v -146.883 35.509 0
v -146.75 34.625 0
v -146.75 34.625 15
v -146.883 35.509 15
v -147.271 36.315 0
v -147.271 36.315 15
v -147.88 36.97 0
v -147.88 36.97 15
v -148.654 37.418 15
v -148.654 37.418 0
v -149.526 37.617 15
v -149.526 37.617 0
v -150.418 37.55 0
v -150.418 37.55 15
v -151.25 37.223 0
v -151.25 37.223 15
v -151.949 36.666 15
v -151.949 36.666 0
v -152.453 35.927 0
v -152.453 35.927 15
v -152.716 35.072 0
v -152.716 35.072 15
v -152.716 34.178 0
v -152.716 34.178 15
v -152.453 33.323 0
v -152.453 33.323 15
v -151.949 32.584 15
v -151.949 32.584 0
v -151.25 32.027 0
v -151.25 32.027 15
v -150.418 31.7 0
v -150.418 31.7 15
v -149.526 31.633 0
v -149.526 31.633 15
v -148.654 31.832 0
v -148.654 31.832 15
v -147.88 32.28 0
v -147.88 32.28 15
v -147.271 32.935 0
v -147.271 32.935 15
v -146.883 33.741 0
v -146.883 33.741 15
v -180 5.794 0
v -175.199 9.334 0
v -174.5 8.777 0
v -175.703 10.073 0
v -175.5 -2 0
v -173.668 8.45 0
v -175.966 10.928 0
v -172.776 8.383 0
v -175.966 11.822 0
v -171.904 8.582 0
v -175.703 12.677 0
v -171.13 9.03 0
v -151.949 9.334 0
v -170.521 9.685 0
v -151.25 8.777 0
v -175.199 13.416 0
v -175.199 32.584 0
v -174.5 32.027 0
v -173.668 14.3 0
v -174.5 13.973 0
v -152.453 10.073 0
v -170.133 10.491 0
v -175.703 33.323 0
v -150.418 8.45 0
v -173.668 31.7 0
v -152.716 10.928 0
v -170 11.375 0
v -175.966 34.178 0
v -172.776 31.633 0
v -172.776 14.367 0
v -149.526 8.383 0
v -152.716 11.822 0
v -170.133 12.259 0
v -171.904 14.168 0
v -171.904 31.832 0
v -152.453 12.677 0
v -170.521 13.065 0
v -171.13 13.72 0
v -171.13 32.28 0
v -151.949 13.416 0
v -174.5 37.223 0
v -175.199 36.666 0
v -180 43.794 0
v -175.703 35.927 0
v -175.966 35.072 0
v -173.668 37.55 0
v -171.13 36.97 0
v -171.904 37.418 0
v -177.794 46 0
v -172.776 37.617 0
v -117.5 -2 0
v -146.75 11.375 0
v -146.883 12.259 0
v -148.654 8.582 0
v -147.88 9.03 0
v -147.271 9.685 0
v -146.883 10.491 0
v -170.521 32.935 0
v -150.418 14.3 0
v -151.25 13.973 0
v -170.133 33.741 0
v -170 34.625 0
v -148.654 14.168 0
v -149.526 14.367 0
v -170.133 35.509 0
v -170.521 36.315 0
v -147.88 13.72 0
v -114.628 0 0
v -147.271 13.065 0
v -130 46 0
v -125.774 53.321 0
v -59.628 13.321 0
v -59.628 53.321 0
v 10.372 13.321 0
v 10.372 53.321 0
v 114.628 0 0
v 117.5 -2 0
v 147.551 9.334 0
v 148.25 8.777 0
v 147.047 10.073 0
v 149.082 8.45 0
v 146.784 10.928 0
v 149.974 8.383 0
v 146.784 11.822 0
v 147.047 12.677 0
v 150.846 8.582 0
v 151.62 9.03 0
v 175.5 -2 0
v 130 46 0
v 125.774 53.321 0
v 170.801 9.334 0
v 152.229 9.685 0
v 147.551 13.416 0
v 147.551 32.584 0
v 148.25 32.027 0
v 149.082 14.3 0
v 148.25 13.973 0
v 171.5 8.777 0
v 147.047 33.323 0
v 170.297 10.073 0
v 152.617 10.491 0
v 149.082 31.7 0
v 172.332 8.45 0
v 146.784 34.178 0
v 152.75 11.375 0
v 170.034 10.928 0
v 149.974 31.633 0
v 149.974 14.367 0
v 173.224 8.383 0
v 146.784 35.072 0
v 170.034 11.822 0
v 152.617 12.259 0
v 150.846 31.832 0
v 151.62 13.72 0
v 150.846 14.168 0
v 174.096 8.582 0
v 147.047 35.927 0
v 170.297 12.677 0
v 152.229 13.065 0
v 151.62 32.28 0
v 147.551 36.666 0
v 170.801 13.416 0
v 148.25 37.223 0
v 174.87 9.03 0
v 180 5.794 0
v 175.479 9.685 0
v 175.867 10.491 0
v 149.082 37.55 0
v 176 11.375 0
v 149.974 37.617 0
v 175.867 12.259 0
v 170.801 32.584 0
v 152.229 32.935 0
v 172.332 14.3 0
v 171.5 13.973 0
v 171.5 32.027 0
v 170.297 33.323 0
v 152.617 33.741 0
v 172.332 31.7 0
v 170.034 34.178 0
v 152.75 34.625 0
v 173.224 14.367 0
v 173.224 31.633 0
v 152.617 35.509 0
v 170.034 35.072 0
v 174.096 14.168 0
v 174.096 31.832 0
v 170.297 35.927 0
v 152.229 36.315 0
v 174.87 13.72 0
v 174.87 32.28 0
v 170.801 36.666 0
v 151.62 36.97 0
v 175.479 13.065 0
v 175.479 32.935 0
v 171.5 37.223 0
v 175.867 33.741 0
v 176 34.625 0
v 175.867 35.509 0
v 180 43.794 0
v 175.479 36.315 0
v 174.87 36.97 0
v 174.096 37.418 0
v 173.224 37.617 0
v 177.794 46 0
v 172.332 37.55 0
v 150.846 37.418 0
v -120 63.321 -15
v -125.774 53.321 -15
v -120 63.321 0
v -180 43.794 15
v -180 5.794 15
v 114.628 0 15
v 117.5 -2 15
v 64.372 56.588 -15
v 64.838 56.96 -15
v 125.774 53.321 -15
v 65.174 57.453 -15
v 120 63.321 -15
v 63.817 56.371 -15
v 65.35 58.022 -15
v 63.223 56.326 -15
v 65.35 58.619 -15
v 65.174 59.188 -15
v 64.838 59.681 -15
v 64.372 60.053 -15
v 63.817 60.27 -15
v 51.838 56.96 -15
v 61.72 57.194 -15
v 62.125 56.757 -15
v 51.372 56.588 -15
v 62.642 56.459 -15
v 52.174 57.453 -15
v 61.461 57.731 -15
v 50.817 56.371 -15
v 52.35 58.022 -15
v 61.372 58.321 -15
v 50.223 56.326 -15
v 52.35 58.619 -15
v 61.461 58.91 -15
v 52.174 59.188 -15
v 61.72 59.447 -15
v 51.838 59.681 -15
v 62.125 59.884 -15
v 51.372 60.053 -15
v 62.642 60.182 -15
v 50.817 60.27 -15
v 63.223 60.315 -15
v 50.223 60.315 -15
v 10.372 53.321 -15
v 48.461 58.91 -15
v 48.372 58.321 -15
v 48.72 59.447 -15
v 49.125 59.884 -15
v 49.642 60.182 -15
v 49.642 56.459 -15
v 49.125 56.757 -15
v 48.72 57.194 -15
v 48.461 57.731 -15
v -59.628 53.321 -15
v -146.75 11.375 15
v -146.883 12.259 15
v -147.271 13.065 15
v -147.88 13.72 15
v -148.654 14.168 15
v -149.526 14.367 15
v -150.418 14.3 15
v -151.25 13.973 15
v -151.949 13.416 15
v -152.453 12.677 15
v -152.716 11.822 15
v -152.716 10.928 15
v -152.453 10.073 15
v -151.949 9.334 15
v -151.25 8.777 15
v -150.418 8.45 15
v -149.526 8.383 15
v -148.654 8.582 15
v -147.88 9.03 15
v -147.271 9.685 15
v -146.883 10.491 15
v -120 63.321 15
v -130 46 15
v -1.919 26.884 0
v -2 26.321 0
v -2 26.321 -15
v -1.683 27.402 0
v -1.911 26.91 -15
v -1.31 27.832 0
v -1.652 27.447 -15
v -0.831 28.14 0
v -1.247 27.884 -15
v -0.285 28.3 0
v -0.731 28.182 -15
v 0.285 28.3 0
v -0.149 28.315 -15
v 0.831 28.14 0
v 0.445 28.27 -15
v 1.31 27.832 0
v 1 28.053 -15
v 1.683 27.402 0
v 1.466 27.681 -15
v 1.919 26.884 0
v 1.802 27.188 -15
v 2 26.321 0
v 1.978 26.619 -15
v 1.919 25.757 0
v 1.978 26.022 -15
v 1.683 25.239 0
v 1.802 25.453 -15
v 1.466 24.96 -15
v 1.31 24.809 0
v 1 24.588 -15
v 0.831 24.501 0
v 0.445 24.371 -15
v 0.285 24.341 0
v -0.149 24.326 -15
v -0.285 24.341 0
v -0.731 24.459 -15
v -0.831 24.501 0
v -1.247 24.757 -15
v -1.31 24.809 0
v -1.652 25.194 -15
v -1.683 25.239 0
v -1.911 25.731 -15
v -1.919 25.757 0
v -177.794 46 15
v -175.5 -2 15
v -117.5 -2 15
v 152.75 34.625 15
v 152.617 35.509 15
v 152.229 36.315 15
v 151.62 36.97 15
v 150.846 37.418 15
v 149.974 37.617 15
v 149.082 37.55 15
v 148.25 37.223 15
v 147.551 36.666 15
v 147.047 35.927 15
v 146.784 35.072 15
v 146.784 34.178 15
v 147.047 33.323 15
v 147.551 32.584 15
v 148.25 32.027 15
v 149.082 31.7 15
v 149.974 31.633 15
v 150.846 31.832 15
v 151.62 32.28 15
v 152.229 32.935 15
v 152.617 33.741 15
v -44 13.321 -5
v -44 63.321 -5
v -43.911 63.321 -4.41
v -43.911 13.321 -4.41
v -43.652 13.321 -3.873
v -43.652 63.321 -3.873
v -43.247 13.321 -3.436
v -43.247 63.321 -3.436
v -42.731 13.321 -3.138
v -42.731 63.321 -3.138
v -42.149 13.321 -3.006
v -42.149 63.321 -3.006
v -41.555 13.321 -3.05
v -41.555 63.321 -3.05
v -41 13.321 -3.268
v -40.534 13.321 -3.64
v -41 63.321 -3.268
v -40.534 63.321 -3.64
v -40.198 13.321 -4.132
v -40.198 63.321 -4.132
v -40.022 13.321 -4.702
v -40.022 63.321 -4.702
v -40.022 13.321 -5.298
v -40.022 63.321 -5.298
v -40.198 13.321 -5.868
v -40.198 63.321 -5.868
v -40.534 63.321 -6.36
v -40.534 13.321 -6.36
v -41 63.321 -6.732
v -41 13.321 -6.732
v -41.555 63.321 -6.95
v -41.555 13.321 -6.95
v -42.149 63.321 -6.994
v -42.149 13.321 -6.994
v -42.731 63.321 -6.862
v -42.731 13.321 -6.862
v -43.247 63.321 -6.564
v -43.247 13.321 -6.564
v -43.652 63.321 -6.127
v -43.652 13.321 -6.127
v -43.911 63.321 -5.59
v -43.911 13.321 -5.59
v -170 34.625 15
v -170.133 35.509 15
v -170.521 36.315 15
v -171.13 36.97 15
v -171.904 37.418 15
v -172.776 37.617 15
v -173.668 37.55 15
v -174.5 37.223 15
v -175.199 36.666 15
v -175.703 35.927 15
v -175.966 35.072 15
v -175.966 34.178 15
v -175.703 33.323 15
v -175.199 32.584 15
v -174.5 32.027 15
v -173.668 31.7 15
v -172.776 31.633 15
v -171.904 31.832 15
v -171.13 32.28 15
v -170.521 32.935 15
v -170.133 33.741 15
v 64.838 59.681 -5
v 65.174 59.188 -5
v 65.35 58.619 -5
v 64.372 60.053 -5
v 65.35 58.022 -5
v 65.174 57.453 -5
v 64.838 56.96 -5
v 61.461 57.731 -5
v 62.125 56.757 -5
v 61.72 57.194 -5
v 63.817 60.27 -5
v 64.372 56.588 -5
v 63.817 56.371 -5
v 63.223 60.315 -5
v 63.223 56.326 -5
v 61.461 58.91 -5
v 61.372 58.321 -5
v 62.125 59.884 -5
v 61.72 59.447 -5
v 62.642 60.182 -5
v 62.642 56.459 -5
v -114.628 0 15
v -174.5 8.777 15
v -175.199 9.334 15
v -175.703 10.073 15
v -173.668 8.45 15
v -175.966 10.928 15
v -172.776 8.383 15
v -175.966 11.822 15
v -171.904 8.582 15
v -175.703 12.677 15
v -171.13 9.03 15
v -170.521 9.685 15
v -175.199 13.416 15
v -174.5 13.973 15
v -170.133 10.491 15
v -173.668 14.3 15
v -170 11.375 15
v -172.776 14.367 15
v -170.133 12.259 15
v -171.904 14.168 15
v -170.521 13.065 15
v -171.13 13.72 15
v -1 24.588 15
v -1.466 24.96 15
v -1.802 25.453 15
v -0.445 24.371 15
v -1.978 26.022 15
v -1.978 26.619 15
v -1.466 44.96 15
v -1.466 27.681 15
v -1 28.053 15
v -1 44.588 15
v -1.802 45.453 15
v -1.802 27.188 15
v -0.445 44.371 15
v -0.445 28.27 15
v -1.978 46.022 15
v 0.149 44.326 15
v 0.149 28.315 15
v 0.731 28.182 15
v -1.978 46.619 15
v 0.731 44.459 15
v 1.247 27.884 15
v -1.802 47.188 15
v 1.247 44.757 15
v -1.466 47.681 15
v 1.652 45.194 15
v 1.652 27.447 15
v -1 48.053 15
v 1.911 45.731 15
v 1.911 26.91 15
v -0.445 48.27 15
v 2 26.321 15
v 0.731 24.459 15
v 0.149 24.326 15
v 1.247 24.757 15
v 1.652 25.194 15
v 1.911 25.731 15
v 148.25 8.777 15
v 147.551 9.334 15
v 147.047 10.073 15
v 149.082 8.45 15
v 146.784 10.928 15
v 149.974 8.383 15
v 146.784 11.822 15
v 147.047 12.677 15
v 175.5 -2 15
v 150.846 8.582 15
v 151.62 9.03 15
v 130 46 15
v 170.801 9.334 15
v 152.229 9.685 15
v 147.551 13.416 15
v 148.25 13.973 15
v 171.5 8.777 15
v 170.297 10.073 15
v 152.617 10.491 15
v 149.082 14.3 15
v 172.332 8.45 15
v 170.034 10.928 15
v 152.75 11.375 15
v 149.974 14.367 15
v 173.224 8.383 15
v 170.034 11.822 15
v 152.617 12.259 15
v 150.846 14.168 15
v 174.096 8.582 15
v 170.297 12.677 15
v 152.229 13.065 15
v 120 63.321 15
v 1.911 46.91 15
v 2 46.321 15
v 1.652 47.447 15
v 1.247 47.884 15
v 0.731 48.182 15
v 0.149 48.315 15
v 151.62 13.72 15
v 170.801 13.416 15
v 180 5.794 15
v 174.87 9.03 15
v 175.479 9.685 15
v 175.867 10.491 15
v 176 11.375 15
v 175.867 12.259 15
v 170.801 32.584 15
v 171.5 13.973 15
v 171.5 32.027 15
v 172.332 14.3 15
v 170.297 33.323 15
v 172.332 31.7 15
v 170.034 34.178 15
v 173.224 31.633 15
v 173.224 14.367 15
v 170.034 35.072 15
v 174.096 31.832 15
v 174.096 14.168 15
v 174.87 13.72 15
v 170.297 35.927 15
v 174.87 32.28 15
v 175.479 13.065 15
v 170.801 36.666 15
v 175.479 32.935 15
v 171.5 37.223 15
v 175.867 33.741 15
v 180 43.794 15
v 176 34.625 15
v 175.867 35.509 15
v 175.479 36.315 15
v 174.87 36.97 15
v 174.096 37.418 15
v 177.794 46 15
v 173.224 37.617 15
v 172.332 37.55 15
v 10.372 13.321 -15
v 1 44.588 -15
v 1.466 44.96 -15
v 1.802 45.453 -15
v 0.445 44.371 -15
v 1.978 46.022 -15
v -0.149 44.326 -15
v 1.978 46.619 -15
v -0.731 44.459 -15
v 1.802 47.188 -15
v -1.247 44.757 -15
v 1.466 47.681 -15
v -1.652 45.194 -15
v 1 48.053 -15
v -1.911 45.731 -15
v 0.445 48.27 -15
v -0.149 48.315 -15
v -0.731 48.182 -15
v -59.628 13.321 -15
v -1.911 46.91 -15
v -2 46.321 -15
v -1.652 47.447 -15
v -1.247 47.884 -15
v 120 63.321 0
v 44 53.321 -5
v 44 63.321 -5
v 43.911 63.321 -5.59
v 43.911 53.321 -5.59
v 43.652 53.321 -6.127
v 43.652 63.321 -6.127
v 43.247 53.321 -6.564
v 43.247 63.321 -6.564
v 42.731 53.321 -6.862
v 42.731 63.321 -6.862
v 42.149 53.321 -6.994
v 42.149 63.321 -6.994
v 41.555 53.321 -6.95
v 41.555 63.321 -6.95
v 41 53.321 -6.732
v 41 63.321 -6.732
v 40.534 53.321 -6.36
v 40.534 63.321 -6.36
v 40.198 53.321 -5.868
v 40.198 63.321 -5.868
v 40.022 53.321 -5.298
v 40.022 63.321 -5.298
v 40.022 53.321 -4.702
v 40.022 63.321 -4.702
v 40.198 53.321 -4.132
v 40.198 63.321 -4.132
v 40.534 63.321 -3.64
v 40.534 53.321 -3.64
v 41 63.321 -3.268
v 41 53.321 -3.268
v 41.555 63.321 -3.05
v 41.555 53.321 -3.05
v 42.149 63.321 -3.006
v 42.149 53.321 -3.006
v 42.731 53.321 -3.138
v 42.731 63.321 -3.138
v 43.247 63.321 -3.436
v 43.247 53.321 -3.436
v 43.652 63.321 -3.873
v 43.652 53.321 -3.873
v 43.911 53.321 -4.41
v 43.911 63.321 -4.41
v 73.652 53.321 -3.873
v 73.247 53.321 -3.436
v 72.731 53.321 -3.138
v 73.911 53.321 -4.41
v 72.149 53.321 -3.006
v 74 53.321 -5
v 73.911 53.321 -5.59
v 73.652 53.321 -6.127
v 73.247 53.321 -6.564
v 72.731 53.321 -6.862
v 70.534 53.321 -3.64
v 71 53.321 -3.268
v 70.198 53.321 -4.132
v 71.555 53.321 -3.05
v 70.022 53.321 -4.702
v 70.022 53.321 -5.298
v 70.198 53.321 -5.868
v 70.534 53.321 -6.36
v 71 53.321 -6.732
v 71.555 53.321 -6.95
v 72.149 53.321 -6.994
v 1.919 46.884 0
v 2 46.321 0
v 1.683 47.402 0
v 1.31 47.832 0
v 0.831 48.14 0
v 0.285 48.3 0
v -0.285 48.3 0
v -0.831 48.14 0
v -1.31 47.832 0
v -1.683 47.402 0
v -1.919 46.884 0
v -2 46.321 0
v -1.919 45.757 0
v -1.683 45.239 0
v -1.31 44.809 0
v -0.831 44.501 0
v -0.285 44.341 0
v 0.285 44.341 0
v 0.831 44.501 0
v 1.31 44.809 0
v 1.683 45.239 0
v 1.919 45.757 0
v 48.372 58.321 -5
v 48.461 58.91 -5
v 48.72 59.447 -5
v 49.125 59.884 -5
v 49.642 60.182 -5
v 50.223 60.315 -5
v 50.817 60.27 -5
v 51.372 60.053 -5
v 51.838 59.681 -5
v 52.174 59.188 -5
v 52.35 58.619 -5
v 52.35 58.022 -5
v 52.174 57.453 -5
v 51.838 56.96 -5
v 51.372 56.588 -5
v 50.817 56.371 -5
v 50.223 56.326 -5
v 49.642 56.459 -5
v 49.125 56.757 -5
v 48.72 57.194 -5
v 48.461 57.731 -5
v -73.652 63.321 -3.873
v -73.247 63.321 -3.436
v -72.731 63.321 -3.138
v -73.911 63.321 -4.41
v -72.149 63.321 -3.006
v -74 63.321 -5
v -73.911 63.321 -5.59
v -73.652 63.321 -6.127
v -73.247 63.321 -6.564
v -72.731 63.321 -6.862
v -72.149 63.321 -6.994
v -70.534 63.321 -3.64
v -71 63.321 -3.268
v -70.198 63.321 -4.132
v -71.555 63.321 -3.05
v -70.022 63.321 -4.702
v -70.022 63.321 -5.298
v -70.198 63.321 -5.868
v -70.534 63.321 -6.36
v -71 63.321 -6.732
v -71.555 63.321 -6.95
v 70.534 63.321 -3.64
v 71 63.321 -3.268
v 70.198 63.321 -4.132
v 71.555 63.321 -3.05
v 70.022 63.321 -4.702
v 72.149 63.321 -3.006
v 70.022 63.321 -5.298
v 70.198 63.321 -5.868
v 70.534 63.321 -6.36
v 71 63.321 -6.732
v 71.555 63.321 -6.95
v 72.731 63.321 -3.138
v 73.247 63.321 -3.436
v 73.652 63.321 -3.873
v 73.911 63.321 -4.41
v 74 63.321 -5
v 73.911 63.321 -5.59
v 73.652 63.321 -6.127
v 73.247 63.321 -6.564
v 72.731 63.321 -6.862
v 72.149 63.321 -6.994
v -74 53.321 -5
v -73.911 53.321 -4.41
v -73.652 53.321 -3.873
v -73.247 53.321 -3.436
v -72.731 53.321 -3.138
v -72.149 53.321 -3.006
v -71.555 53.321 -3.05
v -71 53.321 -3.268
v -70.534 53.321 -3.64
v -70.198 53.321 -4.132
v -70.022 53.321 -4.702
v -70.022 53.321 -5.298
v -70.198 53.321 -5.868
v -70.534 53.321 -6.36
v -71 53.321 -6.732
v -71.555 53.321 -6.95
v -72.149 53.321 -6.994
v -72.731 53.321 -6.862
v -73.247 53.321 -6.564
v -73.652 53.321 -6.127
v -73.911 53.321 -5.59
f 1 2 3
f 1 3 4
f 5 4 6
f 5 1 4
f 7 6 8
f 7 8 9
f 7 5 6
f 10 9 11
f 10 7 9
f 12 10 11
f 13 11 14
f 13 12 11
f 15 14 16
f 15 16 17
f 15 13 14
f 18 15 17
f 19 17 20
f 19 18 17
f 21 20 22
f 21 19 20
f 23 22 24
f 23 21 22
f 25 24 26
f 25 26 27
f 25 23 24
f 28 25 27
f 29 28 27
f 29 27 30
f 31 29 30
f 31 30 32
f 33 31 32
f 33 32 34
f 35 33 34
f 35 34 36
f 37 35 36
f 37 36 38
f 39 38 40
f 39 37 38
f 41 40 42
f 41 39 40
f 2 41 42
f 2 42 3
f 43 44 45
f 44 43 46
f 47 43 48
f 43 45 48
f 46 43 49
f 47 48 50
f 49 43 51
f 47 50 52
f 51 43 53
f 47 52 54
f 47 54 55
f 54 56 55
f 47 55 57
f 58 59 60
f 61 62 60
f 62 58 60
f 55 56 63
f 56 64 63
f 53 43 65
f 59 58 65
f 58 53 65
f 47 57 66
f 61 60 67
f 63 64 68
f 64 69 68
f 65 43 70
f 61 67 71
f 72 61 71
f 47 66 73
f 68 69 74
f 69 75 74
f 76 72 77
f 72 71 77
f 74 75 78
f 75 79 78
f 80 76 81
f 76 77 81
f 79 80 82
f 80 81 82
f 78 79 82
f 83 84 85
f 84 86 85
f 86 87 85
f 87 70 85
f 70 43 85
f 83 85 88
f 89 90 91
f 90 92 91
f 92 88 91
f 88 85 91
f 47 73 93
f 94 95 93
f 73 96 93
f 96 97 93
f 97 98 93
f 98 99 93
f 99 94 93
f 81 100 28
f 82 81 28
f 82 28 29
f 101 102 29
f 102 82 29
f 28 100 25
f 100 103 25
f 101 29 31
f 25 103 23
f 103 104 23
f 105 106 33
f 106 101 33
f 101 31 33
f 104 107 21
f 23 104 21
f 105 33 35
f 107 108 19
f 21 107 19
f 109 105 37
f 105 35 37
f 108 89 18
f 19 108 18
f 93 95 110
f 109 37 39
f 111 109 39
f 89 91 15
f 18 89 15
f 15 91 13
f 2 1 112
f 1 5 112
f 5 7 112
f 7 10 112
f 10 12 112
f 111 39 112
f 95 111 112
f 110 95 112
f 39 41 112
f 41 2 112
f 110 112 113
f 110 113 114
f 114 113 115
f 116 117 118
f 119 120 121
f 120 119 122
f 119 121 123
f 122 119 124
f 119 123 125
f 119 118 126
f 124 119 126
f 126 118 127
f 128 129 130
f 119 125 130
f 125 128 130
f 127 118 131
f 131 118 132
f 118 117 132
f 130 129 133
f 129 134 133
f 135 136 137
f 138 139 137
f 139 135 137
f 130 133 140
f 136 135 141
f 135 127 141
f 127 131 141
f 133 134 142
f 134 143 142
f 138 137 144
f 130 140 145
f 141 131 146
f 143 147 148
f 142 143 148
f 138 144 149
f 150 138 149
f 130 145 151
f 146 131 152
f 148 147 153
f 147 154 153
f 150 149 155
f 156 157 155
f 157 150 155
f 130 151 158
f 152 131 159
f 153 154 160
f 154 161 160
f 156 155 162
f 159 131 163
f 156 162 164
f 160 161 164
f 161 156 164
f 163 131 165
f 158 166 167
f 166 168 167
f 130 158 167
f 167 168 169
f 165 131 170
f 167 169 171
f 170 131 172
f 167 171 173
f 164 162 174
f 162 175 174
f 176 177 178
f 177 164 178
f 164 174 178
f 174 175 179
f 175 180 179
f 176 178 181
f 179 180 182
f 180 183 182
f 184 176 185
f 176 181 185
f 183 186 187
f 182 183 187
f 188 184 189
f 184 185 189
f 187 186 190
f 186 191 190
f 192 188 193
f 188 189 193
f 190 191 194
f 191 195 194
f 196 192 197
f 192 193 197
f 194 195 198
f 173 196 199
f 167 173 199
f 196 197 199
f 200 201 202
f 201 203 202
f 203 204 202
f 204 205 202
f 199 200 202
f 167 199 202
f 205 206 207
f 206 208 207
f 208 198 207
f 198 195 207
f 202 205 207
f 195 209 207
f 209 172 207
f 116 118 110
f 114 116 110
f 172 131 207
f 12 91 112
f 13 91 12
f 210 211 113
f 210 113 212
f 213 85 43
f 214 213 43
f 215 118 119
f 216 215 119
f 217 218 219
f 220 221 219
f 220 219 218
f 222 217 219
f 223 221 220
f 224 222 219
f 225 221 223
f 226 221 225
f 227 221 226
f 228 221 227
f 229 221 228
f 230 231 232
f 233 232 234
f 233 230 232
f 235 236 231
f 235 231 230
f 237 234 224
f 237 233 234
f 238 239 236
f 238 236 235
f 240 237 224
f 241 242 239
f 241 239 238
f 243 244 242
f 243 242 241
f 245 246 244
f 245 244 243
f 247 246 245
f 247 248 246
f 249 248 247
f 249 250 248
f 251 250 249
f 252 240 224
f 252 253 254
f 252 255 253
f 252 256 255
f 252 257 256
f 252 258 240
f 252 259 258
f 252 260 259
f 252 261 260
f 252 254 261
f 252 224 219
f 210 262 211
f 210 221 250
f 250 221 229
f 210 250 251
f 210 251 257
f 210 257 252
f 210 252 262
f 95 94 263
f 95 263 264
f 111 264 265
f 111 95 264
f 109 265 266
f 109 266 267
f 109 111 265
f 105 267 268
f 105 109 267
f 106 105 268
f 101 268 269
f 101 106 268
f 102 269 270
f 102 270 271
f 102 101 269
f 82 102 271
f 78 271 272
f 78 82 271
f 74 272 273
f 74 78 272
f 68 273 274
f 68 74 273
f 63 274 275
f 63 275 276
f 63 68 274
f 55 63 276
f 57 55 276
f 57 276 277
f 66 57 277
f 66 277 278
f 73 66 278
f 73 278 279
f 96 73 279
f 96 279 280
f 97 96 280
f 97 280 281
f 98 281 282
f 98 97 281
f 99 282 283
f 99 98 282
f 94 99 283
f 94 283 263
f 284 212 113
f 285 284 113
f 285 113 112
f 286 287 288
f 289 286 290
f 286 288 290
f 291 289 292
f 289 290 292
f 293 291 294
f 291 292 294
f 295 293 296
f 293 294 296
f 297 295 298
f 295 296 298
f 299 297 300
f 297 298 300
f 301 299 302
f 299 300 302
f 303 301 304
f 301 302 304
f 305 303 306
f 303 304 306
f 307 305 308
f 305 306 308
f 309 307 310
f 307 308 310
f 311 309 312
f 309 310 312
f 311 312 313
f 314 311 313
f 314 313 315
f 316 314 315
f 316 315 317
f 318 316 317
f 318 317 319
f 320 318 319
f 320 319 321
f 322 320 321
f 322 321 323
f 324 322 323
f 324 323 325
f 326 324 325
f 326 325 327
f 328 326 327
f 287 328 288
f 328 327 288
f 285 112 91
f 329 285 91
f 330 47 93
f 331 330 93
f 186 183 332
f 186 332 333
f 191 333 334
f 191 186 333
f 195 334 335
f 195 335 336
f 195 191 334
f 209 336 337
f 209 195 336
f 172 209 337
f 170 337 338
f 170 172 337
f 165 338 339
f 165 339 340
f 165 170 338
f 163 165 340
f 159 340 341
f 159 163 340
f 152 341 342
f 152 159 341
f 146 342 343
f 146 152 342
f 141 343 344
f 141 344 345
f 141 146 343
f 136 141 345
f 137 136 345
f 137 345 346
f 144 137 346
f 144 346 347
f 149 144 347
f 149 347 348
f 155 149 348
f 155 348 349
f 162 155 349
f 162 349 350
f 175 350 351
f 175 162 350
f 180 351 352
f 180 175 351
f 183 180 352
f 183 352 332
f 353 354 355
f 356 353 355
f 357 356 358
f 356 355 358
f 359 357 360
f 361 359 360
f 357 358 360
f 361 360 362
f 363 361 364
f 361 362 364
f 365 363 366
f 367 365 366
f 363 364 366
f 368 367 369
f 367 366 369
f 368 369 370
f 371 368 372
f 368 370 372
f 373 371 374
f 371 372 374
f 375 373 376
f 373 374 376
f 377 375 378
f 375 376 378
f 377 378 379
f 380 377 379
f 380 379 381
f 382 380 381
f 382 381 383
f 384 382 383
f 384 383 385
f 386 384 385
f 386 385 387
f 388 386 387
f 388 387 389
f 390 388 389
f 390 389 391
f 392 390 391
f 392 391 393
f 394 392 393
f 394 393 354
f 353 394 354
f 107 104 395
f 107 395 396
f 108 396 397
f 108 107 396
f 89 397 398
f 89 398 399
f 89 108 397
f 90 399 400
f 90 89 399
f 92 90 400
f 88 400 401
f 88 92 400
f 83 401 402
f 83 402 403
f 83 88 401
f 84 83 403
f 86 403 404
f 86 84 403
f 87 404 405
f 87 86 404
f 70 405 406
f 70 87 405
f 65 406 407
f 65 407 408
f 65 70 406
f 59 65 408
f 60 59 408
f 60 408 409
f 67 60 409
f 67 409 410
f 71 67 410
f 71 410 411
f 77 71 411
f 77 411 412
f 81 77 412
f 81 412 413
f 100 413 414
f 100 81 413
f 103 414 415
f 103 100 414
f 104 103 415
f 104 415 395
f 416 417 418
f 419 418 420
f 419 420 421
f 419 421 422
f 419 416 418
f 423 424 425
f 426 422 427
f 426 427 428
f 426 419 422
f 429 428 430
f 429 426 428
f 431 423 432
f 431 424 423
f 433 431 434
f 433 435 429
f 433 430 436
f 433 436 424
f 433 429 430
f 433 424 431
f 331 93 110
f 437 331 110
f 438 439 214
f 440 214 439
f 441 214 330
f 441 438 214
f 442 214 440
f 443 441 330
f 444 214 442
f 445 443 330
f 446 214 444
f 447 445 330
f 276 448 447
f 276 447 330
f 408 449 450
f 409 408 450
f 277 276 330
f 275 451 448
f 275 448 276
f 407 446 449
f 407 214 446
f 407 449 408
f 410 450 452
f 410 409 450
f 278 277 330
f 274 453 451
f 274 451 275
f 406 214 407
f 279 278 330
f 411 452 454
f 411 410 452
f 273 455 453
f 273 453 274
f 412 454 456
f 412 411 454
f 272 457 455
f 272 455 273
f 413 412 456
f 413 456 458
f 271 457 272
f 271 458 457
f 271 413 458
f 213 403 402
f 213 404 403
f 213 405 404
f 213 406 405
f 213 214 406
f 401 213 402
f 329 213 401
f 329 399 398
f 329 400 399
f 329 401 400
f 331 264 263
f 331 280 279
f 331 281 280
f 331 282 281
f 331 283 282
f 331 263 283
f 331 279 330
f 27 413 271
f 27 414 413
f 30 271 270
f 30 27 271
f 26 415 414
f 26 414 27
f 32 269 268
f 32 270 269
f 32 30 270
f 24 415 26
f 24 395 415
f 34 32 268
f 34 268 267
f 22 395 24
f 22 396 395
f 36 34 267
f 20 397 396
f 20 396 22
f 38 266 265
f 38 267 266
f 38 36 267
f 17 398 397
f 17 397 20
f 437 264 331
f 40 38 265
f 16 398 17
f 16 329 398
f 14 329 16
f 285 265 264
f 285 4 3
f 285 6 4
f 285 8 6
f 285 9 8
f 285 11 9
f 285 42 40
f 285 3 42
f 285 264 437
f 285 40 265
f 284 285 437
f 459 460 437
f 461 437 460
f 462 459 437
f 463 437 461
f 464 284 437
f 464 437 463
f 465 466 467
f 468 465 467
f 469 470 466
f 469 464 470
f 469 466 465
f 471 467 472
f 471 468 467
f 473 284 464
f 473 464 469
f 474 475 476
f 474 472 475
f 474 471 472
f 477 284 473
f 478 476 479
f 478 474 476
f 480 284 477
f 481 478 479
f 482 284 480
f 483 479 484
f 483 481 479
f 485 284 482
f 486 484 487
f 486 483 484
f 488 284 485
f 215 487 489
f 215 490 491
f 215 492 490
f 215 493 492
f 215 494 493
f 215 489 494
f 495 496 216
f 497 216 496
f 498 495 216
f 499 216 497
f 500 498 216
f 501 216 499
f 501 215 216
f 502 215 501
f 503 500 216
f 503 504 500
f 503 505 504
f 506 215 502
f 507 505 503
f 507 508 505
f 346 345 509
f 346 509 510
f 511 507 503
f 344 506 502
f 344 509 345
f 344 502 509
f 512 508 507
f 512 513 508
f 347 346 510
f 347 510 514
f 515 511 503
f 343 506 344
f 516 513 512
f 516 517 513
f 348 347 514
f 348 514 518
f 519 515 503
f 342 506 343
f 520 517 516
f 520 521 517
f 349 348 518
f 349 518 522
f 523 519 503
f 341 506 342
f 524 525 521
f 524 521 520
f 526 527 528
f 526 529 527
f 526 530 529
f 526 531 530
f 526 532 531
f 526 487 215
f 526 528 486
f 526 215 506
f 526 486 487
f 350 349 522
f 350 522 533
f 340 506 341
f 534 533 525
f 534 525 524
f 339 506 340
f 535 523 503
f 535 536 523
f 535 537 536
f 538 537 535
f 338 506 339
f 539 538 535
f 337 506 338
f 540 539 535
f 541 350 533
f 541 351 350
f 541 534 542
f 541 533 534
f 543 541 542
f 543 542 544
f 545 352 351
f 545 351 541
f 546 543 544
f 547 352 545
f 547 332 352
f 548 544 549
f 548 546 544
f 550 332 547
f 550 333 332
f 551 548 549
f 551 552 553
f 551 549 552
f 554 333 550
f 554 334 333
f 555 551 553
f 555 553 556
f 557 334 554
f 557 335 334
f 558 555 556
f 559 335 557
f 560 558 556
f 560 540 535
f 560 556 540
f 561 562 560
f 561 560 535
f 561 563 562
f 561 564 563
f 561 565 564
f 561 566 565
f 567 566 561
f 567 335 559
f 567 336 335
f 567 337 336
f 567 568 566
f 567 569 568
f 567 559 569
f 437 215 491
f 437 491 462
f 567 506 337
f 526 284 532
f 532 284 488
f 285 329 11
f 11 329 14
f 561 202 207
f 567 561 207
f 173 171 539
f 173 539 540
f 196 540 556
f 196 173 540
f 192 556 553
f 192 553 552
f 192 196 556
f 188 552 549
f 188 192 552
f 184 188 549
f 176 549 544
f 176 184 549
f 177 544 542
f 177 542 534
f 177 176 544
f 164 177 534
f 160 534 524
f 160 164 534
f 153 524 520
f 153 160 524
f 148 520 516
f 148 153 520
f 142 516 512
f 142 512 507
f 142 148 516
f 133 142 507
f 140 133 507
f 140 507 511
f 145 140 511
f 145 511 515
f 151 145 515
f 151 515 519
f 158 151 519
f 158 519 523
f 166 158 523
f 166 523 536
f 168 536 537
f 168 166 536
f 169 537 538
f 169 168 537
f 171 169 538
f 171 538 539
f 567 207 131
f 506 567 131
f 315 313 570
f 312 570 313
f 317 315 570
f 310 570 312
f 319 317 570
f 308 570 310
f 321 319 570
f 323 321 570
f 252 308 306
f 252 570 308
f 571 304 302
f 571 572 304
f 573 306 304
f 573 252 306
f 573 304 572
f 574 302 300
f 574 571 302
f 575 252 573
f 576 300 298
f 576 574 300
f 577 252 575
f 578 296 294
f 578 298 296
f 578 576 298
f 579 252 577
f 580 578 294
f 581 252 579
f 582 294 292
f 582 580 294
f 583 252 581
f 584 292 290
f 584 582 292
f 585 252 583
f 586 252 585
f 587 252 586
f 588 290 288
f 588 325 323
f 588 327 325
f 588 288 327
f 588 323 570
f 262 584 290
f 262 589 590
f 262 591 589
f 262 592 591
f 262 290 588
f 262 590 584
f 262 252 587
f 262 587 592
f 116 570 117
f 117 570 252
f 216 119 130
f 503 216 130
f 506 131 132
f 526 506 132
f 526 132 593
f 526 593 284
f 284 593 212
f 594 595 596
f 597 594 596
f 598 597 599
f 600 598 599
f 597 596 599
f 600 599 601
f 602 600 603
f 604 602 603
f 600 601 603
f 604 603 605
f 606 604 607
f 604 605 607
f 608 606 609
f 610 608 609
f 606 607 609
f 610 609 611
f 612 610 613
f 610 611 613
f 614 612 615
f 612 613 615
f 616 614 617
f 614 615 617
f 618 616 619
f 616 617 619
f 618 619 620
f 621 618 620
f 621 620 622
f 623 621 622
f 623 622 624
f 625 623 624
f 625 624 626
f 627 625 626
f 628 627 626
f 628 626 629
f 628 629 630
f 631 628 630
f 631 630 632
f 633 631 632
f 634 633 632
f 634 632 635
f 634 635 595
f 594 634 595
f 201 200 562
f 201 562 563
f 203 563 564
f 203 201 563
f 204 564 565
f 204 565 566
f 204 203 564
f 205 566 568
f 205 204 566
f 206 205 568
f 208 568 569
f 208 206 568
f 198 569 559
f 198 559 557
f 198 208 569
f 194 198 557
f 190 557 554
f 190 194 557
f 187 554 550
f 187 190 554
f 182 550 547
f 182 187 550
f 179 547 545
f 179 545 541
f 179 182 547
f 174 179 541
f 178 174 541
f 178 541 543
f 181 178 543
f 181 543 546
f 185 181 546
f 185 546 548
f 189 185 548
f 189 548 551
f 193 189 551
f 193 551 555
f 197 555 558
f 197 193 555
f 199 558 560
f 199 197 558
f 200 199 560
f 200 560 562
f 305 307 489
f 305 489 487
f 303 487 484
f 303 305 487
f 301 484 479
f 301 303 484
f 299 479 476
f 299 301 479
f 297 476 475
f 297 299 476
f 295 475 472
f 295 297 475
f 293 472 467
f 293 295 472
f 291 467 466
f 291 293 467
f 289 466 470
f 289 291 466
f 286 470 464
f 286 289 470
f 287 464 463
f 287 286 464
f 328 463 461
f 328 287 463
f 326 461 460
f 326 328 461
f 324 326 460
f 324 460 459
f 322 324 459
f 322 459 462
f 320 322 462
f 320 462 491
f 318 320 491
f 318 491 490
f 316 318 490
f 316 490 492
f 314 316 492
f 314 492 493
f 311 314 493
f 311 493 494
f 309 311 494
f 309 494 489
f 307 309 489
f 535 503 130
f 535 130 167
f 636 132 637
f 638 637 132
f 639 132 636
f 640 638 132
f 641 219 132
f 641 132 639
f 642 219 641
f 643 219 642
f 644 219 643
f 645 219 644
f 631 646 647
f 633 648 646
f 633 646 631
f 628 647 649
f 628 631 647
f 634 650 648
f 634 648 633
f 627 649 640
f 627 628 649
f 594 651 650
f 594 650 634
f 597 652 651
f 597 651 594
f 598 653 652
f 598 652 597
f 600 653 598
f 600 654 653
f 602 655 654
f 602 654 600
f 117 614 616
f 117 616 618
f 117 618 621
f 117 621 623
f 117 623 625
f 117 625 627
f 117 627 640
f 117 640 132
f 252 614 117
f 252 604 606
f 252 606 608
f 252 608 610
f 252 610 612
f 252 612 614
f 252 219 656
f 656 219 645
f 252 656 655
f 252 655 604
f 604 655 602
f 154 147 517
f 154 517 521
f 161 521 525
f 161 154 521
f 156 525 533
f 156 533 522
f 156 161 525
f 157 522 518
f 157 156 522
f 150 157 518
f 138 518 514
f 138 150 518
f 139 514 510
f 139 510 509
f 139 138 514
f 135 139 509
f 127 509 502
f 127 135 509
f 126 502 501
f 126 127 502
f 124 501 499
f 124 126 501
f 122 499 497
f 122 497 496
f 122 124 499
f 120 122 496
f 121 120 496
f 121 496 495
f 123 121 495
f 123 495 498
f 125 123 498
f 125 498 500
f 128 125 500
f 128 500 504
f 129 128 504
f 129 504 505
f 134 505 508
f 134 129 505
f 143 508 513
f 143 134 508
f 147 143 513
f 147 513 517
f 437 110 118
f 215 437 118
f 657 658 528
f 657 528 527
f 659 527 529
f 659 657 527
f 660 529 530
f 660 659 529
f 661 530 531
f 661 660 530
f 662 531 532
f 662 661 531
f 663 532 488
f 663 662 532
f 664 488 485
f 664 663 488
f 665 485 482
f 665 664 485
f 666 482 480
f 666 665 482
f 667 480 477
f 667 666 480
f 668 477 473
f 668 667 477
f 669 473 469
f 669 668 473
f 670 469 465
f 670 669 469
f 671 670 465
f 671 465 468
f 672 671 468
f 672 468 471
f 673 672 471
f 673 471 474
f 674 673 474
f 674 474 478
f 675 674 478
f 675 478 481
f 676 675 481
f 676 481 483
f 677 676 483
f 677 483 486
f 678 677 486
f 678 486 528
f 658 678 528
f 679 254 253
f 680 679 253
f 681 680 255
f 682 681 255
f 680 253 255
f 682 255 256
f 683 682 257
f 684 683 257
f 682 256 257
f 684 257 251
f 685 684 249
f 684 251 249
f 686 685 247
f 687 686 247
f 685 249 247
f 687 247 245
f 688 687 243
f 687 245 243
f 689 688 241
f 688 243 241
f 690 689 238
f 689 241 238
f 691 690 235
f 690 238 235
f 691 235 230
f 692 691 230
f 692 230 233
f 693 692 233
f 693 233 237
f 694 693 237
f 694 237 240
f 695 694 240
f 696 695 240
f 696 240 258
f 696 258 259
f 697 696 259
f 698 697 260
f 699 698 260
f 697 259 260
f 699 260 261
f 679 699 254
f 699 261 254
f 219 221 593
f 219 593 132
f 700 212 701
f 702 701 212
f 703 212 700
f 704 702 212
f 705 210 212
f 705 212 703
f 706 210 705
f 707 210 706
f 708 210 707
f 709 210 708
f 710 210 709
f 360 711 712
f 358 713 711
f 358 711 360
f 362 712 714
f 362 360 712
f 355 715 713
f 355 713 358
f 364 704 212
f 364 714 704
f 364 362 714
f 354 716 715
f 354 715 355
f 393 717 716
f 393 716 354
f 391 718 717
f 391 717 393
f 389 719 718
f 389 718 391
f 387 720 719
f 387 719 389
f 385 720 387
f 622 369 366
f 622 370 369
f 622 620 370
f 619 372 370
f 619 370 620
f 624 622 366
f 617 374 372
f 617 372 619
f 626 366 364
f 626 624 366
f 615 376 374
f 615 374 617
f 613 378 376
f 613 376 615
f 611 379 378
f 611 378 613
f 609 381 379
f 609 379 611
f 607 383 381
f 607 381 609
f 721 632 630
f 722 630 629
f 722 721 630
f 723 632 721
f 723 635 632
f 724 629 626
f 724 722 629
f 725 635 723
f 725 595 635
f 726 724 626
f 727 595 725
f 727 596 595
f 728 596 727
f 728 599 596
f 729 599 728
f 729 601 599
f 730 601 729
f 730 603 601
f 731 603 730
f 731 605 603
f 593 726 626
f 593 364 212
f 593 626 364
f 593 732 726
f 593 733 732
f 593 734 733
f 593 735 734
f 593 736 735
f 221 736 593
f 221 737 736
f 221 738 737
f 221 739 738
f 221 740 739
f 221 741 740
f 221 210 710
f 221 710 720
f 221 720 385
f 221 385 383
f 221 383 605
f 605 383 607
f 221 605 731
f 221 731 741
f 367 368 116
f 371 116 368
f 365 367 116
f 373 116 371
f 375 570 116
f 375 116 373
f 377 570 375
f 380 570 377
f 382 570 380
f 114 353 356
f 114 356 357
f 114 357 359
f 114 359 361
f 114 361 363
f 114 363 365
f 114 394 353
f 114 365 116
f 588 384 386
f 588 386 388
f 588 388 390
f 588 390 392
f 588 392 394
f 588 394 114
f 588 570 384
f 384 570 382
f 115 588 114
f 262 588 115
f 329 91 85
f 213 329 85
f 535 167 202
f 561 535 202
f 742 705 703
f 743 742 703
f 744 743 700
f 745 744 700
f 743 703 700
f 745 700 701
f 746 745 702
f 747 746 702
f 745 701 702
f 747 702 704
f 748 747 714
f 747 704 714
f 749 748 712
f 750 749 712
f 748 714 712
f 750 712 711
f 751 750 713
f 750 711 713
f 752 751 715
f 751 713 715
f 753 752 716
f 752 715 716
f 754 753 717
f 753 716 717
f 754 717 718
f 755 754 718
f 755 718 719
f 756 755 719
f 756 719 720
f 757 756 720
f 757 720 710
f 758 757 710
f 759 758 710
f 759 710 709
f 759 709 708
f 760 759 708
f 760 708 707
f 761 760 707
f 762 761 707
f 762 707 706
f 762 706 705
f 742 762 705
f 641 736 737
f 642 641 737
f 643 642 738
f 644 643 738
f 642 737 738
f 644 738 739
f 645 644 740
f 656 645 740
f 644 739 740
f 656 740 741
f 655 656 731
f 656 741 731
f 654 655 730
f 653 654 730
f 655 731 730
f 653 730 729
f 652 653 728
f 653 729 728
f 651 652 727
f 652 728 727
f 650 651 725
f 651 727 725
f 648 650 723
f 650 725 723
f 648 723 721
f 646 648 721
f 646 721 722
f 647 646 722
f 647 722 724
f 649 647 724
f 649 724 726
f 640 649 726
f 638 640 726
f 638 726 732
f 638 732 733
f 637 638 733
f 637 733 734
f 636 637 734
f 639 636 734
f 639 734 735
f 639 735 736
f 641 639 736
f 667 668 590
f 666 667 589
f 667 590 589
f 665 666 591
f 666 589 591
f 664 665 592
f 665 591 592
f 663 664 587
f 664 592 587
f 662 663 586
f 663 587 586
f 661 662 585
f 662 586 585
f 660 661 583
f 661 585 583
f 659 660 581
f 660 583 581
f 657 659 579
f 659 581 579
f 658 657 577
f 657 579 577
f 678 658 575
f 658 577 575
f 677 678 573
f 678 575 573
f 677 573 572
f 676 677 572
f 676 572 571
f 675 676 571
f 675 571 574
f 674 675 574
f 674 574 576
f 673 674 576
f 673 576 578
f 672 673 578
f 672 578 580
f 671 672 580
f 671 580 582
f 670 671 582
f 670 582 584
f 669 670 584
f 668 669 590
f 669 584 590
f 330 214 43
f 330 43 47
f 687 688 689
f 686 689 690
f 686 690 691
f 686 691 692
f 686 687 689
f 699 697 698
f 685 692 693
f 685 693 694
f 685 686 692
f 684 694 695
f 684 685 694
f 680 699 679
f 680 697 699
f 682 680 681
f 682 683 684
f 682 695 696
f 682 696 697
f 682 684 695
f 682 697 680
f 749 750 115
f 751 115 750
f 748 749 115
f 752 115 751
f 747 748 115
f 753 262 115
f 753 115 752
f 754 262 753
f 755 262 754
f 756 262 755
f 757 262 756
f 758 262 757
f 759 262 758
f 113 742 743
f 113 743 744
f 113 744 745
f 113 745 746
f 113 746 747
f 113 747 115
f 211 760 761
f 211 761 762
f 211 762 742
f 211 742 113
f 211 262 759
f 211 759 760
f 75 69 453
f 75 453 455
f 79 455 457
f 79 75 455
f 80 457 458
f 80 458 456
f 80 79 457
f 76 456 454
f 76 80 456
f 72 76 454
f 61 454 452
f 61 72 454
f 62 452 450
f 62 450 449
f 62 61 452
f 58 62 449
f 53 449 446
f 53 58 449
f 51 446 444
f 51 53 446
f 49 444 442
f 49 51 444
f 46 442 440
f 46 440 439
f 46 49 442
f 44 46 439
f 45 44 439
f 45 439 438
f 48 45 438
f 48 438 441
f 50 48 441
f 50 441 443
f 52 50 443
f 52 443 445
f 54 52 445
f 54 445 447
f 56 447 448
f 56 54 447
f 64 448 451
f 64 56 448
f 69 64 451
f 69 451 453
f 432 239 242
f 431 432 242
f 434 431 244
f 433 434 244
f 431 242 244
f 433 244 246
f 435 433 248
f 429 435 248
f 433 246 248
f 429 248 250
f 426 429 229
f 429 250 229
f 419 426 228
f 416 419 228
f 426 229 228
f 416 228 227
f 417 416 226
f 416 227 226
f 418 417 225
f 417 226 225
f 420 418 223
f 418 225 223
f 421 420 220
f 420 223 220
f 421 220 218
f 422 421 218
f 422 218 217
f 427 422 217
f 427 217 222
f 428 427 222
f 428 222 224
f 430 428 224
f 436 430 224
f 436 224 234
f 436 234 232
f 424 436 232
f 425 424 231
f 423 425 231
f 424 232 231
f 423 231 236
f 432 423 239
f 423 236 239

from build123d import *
from build123d.topology import SkipClean

# Parameters (mm, degrees)
SKETCH1_R               = 3
SKETCH1_R_2             = 2
BOSS_EXTRUDE1_DEPTH     = 15
BOSS_EXTRUDE2_START     = 15
SKETCH3_W               = 70
SKETCH3_H               = 40
SKETCH3_R               = 2
BOSS_EXTRUDE2_DEPTH     = 15
SKETCH4_R               = 2
CUT_EXTRUDE1_DEPTH      = 193.072300906
ESQUISSE1_R             = 2
ENL_V_MAT_EXTRU_1_DEPTH = 10


with BuildPart() as part:
    # Sketch1 → Boss-Extrude1 (new body)
    with BuildSketch(Plane.XY):
        Polygon((-114.627718677, 0), (114.627718677, 0), (117.5, -2), (175.5, -2), (180, 5.794228634), (180, 43.794228634), (177.794228634, 46), (130, 46), (120, 63.320508076), (-120, 63.320508076), (-130, 46), (-177.794228634, 46), (-180, 43.794228634), (-180, 5.794228634), (-175.5, -2), (-117.5, -2), align=None)
        with Locations((-173, 34.625)):
            Circle(SKETCH1_R, mode=Mode.SUBTRACT)
        with Locations((-149.75, 34.625)):
            Circle(SKETCH1_R, mode=Mode.SUBTRACT)
        with Locations((-173, 11.375)):
            Circle(SKETCH1_R, mode=Mode.SUBTRACT)
        with Locations((-149.75, 11.375)):
            Circle(SKETCH1_R, mode=Mode.SUBTRACT)
        with Locations((149.75, 34.625)):
            Circle(SKETCH1_R, mode=Mode.SUBTRACT)
        with Locations((173, 34.625)):
            Circle(SKETCH1_R, mode=Mode.SUBTRACT)
        with Locations((149.75, 11.375)):
            Circle(SKETCH1_R, mode=Mode.SUBTRACT)
        with Locations((173, 11.375)):
            Circle(SKETCH1_R, mode=Mode.SUBTRACT)
        with Locations((0, 46.320508076)):
            Circle(SKETCH1_R_2, mode=Mode.SUBTRACT)
        with Locations((0, 26.320508076)):
            Circle(SKETCH1_R_2, mode=Mode.SUBTRACT)
    extrude(amount=BOSS_EXTRUDE1_DEPTH)

    # Sketch3 → Boss-Extrude2 (add)
    # profile 1 of 2: a face of its own
    with SkipClean():  # the faces are left unmerged after this step: merging them gives an invalid solid
        with BuildSketch(Plane(origin=(0, 0, 0), x_dir=(-1, 0, 0), z_dir=(0, 0, -1)).offset(BOSS_EXTRUDE2_START)):
            with Locations((24.627718677, 33.320508076)):
                Rectangle(SKETCH3_W, SKETCH3_H)
            with Locations((0, 26.320508076)):
                Circle(SKETCH3_R, mode=Mode.SUBTRACT)
            with Locations((0, 46.320508076)):
                Circle(SKETCH3_R, mode=Mode.SUBTRACT)
        # profile 2 of 2: a face of its own
        with BuildSketch(Plane(origin=(0, 0, 0), x_dir=(-1, 0, 0), z_dir=(0, 0, -1)).offset(BOSS_EXTRUDE2_START)):
            Polygon((120, 63.320508076), (-120, 63.320508076), (-125.773502692, 53.320508076), (-10.372281323, 53.320508076), (59.627718677, 53.320508076), (125.773502692, 53.320508076), align=None)
        extrude(amount=-BOSS_EXTRUDE2_DEPTH)

    # Sketch4 → Cut-Extrude1 (cut, through all)
    with SkipClean():  # the faces are left unmerged after this step: merging them gives an invalid solid
        with BuildSketch(Plane(origin=(0, 63.320508076, 0), x_dir=(1, 0, 0), z_dir=(0, 1, 0))):
            with Locations(Location((-72, 5, 0), (0, 0, 180))):
                Circle(SKETCH4_R)
            with Locations(Location((-42, 5, 0), (0, 0, 180))):
                Circle(SKETCH4_R)
            with Locations((42, 5)):
                Circle(SKETCH4_R)
            with Locations((72, 5)):
                Circle(SKETCH4_R)
        extrude(amount=-CUT_EXTRUDE1_DEPTH, mode=Mode.SUBTRACT)

    # Esquisse1 → Enlèv. mat.-Extru.1 (cut)
    with SkipClean():  # the faces are left unmerged after this step: merging them gives an invalid solid
        with BuildSketch(Plane(origin=(0, 0, -15), x_dir=(-1, 0, 0), z_dir=(0, 0, -1))):
            with Locations((-50.372281323, 58.320508076)):
                Circle(ESQUISSE1_R)
            with Locations((-63.372281323, 58.320508076)):
                Circle(ESQUISSE1_R)
        extrude(amount=-ENL_V_MAT_EXTRU_1_DEPTH, mode=Mode.SUBTRACT)


solid = part.part
